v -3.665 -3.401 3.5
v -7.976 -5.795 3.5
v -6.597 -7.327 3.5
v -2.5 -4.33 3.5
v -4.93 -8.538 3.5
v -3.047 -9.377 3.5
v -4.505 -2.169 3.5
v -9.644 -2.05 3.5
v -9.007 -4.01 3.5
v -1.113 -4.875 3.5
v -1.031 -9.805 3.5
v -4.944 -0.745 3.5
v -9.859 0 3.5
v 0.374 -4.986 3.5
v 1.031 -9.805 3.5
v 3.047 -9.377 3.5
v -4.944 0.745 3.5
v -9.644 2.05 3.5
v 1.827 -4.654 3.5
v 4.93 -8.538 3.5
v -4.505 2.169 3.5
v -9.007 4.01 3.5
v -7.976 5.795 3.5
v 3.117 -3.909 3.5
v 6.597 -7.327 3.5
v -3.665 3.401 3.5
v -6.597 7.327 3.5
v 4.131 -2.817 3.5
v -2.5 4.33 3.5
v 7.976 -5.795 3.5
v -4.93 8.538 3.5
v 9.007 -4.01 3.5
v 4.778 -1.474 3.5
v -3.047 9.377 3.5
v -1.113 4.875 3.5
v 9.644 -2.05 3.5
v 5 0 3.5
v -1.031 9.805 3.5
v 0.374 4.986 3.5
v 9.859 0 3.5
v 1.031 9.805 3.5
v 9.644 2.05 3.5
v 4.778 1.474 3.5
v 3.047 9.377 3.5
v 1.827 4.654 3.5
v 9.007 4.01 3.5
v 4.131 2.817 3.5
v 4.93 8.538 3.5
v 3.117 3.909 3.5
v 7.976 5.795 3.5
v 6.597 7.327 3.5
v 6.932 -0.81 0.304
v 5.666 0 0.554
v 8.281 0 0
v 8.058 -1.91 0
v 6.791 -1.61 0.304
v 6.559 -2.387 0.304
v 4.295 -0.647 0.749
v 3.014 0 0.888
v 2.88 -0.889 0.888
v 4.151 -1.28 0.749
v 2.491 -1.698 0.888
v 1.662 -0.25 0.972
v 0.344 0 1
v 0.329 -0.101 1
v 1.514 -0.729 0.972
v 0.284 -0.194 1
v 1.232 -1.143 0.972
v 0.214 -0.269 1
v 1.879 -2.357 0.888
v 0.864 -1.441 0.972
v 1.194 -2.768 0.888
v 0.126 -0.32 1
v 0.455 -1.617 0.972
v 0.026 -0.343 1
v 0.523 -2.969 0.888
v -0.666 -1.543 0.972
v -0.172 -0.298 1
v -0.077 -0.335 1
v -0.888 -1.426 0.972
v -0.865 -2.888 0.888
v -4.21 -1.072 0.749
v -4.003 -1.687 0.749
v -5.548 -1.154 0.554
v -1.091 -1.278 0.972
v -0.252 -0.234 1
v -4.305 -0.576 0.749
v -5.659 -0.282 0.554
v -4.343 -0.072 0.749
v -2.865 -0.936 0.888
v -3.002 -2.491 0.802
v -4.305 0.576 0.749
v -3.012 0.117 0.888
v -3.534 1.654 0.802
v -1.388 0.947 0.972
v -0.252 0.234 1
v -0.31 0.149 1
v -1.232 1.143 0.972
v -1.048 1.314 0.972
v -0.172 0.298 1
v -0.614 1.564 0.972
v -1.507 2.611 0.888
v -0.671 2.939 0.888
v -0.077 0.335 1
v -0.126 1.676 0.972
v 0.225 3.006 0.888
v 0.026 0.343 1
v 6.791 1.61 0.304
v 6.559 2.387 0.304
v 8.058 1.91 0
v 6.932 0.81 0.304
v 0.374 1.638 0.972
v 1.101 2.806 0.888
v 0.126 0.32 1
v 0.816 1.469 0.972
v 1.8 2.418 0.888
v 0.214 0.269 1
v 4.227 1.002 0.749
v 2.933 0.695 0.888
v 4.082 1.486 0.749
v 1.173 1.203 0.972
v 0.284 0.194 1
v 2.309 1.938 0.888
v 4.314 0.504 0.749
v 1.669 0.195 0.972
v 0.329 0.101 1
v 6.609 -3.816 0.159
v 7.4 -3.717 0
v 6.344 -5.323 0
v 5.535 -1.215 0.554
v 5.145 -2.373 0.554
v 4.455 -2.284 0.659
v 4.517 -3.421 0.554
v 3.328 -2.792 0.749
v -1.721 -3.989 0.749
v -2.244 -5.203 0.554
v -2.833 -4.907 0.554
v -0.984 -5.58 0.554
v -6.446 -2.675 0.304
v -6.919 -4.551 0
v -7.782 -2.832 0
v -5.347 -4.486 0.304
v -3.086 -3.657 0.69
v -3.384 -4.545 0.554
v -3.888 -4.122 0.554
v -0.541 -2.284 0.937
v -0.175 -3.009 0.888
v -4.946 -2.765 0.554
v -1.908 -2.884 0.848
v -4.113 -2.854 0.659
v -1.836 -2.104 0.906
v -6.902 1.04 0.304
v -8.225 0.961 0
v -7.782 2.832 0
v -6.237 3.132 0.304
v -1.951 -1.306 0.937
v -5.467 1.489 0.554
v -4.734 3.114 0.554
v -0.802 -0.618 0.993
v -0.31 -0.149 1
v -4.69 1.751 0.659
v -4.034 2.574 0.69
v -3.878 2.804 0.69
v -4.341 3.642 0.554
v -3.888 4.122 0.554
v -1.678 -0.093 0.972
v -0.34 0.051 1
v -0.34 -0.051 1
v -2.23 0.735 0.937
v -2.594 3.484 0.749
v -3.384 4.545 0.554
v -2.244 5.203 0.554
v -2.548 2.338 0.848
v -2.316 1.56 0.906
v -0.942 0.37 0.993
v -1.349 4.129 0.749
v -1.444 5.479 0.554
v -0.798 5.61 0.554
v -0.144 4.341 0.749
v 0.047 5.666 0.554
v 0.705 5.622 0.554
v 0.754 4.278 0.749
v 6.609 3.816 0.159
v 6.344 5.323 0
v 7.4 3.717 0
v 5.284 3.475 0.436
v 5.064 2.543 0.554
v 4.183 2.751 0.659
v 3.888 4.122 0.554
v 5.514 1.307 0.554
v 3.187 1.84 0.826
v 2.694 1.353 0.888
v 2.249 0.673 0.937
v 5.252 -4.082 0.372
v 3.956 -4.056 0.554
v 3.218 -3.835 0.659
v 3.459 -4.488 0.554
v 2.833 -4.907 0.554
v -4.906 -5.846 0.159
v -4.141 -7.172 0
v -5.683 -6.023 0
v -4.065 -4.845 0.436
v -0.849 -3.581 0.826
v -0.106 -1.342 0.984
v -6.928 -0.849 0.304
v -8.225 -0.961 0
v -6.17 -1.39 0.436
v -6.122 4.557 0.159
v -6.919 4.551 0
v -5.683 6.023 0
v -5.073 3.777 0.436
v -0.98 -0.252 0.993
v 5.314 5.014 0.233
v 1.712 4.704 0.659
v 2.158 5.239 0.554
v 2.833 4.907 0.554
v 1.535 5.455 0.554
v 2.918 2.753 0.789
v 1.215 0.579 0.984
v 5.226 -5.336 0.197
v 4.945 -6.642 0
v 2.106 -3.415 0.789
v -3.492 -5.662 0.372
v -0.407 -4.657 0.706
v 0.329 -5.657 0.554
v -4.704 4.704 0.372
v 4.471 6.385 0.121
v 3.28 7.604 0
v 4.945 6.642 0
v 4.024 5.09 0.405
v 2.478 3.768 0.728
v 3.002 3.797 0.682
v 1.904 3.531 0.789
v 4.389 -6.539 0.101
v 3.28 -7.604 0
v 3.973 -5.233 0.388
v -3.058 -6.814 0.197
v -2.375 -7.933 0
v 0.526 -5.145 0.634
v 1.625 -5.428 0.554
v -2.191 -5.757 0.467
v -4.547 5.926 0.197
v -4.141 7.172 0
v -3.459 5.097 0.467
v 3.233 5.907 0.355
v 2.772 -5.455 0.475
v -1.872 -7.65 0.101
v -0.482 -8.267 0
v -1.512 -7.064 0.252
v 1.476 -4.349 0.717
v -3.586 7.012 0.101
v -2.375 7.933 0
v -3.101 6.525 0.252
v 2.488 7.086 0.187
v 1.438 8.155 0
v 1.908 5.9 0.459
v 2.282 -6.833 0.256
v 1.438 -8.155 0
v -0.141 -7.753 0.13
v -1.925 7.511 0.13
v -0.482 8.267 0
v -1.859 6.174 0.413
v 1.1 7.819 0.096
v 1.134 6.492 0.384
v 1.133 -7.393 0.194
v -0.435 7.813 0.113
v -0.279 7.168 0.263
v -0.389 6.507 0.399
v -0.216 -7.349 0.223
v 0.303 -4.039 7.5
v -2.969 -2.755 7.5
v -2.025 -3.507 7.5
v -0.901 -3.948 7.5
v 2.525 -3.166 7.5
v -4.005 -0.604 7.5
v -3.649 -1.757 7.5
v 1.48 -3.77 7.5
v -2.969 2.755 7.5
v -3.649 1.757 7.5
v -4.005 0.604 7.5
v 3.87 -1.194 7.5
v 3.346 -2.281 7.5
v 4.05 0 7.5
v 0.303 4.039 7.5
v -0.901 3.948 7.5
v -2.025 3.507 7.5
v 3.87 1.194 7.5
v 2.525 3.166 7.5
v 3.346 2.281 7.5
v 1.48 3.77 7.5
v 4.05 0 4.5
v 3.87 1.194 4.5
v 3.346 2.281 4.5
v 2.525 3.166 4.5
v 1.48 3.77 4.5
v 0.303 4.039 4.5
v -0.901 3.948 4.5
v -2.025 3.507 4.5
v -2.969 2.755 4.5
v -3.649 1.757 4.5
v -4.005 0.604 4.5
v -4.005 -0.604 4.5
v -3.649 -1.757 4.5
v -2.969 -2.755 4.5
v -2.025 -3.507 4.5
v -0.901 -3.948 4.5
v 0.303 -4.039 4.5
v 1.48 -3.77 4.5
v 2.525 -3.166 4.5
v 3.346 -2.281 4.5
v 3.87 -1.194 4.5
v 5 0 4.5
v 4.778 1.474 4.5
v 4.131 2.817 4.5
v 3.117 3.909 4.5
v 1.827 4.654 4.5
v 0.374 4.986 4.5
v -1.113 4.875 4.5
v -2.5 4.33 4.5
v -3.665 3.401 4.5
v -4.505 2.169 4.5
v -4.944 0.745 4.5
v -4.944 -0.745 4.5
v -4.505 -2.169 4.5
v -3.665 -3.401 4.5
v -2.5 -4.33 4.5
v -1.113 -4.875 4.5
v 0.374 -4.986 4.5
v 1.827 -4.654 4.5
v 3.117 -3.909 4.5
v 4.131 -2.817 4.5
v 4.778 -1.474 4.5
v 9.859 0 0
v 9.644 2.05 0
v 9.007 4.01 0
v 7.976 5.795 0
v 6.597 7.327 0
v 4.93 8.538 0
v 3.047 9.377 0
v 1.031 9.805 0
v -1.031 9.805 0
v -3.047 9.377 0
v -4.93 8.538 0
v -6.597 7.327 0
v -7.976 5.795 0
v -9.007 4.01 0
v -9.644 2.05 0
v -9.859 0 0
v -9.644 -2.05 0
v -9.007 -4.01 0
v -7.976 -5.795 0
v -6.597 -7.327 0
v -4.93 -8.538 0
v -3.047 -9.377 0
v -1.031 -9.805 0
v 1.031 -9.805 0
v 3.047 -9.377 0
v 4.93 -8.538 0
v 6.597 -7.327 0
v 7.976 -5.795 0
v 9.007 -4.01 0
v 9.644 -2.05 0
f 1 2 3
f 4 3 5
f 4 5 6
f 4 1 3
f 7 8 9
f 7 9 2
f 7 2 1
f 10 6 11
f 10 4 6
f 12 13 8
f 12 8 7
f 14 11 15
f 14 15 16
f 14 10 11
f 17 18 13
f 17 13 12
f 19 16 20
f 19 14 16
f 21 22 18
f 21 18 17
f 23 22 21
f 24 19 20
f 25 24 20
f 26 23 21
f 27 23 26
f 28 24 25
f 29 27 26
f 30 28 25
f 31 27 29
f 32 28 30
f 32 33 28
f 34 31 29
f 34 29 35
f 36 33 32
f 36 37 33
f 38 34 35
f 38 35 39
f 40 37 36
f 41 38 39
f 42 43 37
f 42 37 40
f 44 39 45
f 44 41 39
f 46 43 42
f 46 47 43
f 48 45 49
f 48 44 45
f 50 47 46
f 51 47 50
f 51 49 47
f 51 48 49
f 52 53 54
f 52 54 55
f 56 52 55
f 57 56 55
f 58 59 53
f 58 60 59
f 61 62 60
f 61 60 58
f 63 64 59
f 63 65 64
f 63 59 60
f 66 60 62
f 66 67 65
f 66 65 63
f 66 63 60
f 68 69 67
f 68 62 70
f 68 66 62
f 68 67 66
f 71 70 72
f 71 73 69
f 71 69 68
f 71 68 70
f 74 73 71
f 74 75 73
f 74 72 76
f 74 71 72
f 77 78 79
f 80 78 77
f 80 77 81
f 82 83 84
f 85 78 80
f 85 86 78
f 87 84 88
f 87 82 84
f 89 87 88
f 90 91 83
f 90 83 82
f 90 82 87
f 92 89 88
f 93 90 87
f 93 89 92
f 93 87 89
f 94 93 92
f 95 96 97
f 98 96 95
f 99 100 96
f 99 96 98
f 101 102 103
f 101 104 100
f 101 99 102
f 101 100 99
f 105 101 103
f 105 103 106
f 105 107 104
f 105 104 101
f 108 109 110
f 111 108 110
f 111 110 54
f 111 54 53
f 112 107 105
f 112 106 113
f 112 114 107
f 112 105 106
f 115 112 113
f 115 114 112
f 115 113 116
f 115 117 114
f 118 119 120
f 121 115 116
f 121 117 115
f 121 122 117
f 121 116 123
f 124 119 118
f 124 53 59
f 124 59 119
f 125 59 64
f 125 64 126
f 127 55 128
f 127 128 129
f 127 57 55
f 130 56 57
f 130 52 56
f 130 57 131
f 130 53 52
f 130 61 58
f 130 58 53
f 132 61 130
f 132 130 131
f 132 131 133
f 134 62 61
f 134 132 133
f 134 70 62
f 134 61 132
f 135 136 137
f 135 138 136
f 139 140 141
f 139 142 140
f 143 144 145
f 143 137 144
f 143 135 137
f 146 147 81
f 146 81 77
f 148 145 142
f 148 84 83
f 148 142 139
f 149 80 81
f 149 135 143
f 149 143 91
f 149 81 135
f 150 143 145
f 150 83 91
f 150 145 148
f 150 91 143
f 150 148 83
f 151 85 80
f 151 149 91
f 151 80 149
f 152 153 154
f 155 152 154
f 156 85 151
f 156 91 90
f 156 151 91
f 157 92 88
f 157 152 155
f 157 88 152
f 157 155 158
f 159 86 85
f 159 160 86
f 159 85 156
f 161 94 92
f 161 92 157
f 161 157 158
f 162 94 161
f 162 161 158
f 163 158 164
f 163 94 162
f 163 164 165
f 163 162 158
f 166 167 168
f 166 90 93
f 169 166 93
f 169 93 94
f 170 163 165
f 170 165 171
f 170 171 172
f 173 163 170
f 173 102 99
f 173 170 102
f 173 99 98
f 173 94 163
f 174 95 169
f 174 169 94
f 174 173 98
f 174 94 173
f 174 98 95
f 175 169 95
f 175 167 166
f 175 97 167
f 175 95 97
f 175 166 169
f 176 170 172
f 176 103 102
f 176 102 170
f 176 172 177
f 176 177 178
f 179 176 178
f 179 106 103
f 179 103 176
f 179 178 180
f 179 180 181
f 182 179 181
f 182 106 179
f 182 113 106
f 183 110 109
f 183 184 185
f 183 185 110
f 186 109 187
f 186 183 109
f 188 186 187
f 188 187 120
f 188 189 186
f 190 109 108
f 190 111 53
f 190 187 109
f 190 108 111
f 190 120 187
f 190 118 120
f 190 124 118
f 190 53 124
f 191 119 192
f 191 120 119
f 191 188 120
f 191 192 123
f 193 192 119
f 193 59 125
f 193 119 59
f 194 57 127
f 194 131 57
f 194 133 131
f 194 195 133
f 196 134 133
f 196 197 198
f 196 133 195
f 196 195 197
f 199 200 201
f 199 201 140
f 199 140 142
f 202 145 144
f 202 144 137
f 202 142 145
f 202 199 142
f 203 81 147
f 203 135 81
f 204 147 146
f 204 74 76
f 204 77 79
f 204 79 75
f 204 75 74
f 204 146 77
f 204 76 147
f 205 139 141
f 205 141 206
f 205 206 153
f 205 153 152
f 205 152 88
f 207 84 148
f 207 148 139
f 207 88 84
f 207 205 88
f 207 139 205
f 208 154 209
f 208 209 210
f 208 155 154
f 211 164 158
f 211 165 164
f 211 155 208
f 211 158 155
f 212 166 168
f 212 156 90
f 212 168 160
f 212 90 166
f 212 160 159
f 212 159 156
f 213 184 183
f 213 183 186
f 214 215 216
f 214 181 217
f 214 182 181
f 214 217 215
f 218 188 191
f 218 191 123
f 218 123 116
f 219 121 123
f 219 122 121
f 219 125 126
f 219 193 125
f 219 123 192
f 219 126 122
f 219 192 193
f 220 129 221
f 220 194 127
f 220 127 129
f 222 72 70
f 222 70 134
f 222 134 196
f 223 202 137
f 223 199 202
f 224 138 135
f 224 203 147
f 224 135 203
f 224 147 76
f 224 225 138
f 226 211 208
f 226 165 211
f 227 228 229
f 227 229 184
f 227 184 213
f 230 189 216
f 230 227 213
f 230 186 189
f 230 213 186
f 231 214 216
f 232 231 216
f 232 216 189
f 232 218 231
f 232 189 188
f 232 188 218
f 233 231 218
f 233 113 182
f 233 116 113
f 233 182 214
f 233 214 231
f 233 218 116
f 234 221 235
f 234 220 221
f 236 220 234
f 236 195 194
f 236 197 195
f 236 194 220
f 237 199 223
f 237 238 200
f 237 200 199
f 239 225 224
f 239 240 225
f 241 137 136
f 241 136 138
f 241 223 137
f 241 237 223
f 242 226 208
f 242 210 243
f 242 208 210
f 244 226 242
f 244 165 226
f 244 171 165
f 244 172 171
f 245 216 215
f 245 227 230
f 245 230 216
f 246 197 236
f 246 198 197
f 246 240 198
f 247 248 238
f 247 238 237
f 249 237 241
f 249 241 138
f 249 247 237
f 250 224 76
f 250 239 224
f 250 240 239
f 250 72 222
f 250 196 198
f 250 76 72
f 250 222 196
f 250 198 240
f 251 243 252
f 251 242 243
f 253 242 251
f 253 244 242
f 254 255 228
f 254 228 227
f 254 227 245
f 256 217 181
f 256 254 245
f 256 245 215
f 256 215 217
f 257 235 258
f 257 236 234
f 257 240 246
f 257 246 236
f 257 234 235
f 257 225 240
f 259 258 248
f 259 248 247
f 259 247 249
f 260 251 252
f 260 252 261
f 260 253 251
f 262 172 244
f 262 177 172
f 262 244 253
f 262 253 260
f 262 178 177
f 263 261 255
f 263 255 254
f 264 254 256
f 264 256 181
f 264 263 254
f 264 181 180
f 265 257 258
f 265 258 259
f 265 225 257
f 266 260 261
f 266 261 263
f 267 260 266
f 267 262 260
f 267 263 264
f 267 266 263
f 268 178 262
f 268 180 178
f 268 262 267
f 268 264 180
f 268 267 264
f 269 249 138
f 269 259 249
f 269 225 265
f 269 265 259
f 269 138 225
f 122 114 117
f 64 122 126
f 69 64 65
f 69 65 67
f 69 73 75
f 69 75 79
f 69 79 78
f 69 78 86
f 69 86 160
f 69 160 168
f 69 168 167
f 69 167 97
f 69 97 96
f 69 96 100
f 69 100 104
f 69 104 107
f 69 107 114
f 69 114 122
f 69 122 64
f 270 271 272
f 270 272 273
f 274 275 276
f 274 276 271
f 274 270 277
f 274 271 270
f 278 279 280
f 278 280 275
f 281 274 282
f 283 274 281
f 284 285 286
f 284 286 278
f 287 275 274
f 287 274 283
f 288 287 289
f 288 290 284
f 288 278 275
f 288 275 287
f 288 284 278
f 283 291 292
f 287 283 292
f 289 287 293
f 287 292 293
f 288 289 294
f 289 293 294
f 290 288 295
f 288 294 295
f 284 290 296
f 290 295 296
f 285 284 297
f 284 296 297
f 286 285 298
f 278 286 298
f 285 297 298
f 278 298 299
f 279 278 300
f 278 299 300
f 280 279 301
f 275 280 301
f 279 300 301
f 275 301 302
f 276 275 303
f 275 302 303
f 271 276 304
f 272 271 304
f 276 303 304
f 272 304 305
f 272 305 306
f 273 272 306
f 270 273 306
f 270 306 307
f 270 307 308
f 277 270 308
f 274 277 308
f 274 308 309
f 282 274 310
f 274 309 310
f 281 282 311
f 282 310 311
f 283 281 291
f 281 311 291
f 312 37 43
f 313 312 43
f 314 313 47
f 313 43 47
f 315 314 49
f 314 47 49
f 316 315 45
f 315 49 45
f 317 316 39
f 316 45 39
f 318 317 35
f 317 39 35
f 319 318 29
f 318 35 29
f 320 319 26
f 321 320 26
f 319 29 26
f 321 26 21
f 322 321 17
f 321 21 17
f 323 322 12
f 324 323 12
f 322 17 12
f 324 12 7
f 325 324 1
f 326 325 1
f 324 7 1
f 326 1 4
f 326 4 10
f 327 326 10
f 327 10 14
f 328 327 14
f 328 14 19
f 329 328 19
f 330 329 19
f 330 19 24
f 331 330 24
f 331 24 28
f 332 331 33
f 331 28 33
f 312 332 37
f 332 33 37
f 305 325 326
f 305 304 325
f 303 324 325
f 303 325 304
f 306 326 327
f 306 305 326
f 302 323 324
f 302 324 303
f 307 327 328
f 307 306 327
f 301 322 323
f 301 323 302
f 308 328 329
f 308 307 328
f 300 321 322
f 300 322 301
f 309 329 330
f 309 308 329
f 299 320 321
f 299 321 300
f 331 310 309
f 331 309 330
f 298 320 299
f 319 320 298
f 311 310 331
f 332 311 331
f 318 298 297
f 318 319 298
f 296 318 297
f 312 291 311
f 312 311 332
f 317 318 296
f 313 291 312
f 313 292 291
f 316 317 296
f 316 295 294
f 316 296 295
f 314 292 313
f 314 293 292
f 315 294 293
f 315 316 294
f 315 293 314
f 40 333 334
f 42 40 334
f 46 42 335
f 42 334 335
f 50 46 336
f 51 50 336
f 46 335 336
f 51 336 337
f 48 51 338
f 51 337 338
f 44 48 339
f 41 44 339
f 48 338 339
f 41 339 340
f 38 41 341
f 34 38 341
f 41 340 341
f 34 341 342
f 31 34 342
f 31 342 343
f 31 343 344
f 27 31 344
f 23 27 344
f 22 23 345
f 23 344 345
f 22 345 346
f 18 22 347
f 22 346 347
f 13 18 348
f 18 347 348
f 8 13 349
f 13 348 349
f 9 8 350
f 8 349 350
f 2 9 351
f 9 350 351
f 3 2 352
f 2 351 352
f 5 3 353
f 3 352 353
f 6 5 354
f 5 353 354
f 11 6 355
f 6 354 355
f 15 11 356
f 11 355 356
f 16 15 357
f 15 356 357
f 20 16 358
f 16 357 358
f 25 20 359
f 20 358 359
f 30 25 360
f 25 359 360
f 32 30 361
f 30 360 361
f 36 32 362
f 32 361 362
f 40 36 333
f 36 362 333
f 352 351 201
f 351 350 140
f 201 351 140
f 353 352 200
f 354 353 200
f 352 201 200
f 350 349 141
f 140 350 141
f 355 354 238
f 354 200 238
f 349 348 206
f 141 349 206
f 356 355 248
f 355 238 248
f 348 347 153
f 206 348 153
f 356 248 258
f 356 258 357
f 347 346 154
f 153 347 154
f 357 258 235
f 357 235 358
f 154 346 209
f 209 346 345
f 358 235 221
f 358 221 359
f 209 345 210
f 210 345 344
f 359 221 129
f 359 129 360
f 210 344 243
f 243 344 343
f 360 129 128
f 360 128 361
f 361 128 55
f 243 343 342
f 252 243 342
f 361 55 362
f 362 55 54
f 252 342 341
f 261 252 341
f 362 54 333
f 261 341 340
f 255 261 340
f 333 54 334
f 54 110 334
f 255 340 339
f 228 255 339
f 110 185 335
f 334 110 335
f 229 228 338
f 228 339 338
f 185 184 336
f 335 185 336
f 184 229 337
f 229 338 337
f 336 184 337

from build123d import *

# Parameters (mm, degrees)
F0_R     = 9.8592181747
F1_DEPTH = 3.5
F2_R     = 5
F3_DEPTH = 1
F4_R     = 4.05
F5_DEPTH = 3
F6_R     = 8.2811029309
F7_DEPTH = 1


# Not quite as in the source:
# - a fillet or chamfer that OpenCascade refuses, or shapes differently, is made with other operations: its cross-section is extruded or revolved along the edge and cut away or added


with BuildPart() as f1:
    # F0 (on Top) → F1 (new body)
    with BuildSketch(Plane.XY):
        Circle(F0_R)
    extrude(amount=F1_DEPTH)

    # F2 (on face) → F3 (join)
    with BuildSketch(Plane.XY.offset(3.5)):
        Circle(F2_R)
    extrude(amount=F3_DEPTH)

    # F4 (on face) → F5 (join)
    with BuildSketch(Plane.XY.offset(4.5)):
        Circle(F4_R)
    extrude(amount=F5_DEPTH)

    # F6 (on face) → F7 (cut)
    with BuildSketch(Plane(origin=(0, 0, 0), x_dir=(1, 0, 0), z_dir=(0, 0, -1))):
        Circle(F6_R)
    extrude(amount=-F7_DEPTH, mode=Mode.SUBTRACT)

    # F8: fillet of radius 32 on 1 edges, made by hand

    # F8_s1 → F8_t2 (revolve)
    with BuildSketch(Plane.XZ):
        with BuildLine():
            ThreePointArc((8.2811029309, 0), (4.3438489977, 0.7490157328), (0.3438489977, 1))
            Line((0.3438489977, 1), (8.2811029309, 1))
            Line((8.2811029309, 1), (8.2811029309, 0))
        make_face()
    revolve(axis=Axis((0, 0, 1), (0, 0, -1)))


solid = f1.part
